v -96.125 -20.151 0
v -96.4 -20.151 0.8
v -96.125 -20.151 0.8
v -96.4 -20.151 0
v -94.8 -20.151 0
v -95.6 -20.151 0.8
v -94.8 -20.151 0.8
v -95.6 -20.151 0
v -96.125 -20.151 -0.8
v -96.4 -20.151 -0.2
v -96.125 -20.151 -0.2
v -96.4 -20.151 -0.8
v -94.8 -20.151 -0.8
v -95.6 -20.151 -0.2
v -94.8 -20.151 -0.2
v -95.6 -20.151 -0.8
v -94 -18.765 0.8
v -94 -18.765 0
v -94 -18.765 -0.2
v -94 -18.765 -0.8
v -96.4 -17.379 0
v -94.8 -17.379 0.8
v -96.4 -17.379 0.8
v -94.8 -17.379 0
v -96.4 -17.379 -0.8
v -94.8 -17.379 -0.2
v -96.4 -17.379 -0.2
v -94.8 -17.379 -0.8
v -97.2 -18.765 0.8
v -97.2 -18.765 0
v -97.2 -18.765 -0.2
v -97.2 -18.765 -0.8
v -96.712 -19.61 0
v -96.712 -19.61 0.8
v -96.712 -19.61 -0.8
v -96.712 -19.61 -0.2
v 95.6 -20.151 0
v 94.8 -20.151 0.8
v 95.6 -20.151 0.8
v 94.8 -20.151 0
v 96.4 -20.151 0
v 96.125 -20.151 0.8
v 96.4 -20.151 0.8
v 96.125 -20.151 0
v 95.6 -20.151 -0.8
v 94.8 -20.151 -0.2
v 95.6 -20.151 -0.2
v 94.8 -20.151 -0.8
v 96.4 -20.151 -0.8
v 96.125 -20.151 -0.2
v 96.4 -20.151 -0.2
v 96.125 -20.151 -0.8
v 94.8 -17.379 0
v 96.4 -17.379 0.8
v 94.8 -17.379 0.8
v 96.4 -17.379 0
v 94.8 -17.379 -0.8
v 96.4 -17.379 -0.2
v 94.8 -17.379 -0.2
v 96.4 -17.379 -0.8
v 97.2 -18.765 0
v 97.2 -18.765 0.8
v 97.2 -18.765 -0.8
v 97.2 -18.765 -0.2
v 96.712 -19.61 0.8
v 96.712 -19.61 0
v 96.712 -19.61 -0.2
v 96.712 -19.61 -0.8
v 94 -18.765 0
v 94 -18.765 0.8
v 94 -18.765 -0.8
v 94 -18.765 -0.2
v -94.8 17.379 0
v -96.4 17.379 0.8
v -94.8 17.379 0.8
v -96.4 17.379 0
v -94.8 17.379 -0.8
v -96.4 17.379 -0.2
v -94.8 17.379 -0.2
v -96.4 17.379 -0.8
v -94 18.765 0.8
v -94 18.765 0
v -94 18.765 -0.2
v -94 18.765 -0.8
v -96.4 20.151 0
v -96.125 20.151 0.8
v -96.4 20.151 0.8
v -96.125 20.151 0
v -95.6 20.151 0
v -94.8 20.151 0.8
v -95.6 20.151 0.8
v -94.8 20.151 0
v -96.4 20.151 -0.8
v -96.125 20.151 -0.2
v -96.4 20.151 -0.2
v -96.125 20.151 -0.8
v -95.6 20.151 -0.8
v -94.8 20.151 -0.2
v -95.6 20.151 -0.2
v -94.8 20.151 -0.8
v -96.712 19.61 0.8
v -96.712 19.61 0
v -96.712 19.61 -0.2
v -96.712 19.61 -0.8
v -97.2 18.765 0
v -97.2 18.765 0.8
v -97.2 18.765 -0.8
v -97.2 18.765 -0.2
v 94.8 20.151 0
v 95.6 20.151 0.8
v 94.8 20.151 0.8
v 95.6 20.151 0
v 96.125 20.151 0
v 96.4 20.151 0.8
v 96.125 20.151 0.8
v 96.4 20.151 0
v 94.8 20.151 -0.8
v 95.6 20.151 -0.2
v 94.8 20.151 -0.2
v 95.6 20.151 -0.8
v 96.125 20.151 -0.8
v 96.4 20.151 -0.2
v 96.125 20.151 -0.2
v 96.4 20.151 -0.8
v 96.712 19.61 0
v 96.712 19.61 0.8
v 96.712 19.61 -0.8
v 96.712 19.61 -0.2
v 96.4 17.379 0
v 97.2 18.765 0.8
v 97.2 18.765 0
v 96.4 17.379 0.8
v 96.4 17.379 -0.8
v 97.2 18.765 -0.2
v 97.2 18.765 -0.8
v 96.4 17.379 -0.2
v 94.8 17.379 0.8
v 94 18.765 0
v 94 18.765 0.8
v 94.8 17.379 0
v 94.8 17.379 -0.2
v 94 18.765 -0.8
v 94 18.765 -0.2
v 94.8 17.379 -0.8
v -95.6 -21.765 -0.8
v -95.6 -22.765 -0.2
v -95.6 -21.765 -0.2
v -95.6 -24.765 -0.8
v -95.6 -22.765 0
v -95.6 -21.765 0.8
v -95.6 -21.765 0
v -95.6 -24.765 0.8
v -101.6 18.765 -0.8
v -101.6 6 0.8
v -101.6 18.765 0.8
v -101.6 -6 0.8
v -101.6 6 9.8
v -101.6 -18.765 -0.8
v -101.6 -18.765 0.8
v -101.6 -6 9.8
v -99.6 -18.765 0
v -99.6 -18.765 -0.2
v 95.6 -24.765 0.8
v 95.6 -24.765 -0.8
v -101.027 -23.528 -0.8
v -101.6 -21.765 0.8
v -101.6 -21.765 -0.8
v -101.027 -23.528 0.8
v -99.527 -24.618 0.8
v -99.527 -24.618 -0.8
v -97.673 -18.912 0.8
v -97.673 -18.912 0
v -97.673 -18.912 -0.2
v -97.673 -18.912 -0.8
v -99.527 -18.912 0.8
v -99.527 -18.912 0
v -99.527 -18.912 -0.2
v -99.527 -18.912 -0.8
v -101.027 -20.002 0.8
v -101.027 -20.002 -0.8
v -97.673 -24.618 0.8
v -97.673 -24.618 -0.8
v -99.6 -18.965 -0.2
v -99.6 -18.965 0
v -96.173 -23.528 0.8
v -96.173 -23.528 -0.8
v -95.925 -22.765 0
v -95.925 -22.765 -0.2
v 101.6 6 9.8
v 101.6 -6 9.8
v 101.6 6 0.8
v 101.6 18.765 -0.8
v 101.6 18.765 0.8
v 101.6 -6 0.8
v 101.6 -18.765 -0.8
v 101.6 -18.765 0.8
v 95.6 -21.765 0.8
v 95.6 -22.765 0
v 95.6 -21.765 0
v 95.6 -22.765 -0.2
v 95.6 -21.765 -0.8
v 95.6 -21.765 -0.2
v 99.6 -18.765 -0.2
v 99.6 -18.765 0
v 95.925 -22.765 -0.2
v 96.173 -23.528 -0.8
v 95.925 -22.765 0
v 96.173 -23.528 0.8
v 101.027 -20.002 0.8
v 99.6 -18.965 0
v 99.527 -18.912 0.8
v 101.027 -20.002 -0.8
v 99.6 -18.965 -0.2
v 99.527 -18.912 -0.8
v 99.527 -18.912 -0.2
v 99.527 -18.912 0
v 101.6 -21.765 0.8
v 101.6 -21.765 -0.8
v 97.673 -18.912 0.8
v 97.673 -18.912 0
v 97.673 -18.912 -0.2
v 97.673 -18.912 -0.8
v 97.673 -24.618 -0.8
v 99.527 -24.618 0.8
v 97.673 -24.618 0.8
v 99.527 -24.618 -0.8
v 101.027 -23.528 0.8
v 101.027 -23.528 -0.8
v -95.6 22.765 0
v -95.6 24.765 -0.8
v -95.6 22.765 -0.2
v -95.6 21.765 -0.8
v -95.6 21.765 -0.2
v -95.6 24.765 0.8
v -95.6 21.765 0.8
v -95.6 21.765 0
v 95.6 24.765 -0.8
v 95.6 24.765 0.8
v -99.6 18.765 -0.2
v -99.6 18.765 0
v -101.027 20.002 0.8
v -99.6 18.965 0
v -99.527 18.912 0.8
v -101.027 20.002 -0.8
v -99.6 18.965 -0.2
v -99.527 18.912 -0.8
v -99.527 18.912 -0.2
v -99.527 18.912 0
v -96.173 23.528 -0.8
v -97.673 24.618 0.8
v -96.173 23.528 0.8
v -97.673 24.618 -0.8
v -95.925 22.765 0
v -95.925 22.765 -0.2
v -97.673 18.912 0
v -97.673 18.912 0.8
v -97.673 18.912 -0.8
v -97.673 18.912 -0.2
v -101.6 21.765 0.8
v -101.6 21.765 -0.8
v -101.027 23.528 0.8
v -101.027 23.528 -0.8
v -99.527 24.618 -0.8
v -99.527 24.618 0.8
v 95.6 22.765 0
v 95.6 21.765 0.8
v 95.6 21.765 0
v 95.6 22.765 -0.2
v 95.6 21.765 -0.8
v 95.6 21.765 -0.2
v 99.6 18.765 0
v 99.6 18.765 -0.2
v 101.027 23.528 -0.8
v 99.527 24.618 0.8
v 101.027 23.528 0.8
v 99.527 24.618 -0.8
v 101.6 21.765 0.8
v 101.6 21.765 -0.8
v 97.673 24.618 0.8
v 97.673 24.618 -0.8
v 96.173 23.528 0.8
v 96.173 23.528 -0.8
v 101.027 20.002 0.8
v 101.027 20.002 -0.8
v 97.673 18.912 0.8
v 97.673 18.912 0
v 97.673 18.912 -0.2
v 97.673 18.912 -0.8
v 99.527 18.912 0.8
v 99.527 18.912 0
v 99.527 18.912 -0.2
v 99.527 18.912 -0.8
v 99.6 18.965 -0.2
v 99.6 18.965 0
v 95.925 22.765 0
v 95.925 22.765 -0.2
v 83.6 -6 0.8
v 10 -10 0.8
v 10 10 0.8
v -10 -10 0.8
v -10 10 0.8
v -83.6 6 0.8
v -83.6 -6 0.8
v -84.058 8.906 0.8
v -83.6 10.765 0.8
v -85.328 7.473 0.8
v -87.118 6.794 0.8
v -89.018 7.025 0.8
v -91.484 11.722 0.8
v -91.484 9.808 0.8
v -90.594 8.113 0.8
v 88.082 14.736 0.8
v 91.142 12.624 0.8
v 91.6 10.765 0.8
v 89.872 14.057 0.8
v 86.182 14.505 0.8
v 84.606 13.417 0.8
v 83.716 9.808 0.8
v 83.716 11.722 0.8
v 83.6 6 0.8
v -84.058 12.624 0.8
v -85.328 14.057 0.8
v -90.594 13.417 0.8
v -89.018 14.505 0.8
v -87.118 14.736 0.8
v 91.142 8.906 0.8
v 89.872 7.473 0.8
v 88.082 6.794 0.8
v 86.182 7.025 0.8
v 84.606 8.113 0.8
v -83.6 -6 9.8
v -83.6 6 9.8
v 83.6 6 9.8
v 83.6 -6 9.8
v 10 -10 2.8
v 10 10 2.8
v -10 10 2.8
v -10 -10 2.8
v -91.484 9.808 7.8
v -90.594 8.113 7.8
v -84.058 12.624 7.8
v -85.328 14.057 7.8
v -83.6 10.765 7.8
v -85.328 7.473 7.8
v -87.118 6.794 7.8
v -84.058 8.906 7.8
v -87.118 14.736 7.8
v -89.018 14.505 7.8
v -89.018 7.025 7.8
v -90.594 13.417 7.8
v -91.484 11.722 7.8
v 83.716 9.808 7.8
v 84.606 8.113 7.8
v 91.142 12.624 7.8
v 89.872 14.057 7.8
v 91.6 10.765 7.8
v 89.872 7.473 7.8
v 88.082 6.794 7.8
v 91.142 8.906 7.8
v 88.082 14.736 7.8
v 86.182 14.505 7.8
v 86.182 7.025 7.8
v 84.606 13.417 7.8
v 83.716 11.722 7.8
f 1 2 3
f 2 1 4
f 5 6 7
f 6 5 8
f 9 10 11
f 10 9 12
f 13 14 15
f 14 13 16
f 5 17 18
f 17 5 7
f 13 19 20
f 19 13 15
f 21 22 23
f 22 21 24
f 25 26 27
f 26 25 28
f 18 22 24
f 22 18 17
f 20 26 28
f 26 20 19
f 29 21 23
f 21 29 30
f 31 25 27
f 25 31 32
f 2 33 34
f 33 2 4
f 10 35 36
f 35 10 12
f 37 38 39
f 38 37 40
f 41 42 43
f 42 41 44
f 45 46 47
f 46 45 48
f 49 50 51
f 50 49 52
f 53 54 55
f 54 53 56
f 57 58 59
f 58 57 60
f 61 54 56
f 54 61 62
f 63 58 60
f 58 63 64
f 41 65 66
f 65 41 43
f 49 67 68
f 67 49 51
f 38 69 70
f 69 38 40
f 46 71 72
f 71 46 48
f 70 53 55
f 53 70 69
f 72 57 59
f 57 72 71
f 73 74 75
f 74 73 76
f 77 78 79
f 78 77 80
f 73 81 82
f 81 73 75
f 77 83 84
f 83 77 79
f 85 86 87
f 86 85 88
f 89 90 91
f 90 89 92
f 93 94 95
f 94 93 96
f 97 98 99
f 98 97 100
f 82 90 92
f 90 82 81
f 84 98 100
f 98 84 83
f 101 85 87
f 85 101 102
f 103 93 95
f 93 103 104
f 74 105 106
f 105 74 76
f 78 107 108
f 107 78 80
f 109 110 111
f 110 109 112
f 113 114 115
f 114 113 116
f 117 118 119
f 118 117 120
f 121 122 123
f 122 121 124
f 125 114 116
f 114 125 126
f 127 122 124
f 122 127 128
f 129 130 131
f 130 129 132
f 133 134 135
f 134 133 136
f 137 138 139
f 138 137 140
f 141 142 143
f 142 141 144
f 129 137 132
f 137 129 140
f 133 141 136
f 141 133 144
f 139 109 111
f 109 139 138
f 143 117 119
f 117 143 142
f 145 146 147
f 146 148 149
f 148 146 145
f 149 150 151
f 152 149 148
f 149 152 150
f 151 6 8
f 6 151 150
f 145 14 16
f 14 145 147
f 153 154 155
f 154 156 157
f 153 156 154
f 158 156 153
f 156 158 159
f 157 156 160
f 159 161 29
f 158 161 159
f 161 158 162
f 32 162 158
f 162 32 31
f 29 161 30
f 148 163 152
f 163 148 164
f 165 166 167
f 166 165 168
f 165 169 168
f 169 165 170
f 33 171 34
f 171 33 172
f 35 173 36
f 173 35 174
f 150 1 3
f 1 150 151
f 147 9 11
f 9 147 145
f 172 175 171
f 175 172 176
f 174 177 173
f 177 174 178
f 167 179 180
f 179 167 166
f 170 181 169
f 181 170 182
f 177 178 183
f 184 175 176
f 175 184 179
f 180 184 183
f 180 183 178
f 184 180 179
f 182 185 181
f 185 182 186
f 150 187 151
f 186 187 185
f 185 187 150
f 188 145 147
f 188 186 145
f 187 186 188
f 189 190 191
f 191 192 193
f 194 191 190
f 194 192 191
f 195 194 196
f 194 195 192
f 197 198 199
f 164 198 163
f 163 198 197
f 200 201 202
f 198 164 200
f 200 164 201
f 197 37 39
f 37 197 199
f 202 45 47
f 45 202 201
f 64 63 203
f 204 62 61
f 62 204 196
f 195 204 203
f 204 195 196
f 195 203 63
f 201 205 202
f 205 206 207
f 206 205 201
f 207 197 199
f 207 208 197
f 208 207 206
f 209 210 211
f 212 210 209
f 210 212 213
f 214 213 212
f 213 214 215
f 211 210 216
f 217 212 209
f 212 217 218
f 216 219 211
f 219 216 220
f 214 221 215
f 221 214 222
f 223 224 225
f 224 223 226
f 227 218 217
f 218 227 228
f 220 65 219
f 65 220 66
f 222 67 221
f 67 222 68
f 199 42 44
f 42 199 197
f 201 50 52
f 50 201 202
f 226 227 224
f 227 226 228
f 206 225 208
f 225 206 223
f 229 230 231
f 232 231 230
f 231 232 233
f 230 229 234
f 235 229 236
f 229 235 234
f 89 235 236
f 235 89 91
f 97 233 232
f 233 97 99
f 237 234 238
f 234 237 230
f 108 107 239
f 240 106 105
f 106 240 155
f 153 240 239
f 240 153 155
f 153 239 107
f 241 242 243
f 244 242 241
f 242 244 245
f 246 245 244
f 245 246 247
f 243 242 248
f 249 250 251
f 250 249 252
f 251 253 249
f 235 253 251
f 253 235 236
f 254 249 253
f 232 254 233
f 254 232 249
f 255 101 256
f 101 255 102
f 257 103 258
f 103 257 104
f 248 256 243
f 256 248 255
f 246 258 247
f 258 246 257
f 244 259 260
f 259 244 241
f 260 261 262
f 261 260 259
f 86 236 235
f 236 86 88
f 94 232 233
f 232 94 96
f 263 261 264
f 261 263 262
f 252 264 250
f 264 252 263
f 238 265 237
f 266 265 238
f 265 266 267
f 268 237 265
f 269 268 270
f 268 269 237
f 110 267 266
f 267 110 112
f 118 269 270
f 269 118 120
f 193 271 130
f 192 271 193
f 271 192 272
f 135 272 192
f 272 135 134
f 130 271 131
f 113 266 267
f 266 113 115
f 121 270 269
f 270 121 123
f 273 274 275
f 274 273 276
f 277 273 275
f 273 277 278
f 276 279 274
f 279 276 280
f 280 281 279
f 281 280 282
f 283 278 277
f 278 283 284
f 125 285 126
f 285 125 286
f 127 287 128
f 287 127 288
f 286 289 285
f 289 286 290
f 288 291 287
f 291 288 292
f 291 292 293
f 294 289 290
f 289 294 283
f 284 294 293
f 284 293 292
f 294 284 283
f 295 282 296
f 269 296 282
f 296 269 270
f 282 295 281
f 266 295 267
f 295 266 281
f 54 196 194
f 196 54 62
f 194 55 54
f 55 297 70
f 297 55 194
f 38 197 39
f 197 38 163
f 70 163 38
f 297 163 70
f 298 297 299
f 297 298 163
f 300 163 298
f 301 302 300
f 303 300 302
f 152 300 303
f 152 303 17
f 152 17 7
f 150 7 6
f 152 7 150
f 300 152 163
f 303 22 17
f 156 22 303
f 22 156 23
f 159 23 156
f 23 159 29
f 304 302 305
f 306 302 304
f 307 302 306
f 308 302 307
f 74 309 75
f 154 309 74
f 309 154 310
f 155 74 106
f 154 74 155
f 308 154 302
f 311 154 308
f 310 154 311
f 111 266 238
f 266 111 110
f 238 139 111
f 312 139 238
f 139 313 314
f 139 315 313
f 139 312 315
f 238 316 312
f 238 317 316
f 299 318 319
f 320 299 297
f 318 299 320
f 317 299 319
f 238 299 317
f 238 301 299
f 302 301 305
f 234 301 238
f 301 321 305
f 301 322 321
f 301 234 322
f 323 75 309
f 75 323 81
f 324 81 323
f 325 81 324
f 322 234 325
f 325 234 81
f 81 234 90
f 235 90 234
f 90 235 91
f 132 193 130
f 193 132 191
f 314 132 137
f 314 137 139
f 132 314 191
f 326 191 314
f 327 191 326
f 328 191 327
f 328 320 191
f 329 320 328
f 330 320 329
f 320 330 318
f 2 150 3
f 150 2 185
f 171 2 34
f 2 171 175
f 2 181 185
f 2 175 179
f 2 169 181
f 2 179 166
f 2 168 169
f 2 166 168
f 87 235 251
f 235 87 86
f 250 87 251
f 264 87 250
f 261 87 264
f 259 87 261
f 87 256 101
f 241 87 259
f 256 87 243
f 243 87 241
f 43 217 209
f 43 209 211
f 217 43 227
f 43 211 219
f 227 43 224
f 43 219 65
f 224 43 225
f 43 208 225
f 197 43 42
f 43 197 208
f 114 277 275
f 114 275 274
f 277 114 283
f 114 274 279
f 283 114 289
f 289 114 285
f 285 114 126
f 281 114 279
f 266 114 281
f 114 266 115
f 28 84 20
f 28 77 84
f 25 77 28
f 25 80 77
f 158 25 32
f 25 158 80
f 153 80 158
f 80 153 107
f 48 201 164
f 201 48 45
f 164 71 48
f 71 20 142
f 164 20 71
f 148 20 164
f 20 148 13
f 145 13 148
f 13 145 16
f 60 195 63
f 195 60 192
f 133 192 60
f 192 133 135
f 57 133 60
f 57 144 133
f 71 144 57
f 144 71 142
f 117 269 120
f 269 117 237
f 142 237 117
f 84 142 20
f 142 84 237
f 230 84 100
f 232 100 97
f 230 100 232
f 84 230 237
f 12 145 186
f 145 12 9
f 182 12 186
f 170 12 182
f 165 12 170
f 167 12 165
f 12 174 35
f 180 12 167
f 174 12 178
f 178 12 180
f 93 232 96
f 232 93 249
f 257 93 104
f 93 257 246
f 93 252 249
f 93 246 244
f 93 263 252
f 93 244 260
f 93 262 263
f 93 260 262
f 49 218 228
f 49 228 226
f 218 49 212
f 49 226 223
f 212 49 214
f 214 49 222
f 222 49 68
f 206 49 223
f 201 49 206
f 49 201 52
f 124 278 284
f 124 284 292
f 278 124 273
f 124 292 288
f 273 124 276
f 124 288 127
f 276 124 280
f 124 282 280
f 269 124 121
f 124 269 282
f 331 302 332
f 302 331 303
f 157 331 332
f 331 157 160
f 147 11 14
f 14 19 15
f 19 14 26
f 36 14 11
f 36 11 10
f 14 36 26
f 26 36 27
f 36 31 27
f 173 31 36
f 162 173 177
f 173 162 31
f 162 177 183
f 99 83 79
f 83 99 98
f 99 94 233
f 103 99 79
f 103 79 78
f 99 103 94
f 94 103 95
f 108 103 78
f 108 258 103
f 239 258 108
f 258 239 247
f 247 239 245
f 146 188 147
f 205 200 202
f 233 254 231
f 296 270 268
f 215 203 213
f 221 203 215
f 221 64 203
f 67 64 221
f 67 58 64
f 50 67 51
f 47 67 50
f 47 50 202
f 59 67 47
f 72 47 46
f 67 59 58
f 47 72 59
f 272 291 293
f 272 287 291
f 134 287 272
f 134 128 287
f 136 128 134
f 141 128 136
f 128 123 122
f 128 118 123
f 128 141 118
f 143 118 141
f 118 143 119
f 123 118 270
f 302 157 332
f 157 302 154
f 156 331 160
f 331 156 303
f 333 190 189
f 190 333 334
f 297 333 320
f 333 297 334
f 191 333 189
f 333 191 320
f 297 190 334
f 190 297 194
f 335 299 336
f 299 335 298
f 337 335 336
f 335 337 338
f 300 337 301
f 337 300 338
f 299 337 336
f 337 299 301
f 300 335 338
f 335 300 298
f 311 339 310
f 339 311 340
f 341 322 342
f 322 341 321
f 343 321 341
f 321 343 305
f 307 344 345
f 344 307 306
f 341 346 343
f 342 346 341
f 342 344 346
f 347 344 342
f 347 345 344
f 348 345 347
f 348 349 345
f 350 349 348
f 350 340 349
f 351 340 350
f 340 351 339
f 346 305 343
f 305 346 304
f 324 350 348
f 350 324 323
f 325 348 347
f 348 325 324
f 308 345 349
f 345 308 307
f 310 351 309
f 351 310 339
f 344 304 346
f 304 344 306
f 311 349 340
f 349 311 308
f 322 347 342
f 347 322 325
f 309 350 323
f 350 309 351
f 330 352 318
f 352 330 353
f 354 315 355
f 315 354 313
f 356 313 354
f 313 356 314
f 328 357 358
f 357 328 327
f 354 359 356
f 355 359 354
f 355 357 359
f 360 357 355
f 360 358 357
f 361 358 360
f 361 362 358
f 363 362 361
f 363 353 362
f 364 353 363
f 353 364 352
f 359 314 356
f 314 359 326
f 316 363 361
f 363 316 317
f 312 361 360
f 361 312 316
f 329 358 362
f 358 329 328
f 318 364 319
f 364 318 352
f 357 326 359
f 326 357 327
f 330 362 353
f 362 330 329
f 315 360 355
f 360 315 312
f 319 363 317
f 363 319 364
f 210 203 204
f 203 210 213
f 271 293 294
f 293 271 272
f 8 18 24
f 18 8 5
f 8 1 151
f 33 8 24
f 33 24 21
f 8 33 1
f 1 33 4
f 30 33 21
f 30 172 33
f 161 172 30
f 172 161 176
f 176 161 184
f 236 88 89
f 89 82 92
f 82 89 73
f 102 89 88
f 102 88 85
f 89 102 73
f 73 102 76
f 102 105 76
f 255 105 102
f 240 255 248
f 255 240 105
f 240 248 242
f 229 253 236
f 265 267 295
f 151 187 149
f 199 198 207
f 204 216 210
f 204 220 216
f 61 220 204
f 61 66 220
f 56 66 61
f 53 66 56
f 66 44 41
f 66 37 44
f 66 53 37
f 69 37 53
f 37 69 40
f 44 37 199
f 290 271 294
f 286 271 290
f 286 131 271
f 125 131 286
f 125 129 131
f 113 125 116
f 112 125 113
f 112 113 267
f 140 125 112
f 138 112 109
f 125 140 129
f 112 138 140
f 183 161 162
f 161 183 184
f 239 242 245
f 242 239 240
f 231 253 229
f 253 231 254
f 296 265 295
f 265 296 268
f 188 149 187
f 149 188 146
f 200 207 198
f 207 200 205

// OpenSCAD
// Parameters
pcb_length = 203.2; //[101.6:406.4:0.1]
pcb_width = 49.53; //[24.765:99.06:0.01]
pcb_thickness = 1.6; //[0.8:3.2:0.1]
corner_radius = 3.0; //[1.5:6.0:0.1]
mount_hole_diameter = 3.2; //[2.0:5.0:0.1]
mount_hole_edge_offset_x = 6.0; //[3.0:12.0:0.1]
mount_hole_edge_offset_y = 6.0; //[3.0:12.0:0.1]
hole_clearance_height = 6.0; //[3.0:12.0:0.5]
overlap = 1.0; //[0.5:2.0:0.1]
silkscreen_thickness = 0.2; //[0.1:0.5:0.05]
silkscreen_margin = 2.0; //[1.0:5.0:0.1]
connector_block_length = 18.0; //[9.0:36.0:0.5]
connector_block_width = 12.0; //[6.0:24.0:0.5]
connector_block_height = 10.0; //[5.0:20.0:0.5]
component_chip_length = 20.0; //[10.0:40.0:0.5]
component_chip_width = 20.0; //[10.0:40.0:0.5]
component_chip_height = 3.0; //[1.5:6.0:0.1]
component_cap_radius = 4.0; //[2.0:8.0:0.1]
component_cap_height = 8.0; //[4.0:16.0:0.5]

// Main PCB Body
module pcb_main_body() {
  color([0.0, 0.4, 0.2]) // Green PCB
  cube([pcb_length, pcb_width, pcb_thickness], center=true);
}

// Mounting Holes
module mounting_holes() {
  union() {
    translate([-pcb_length/2 + mount_hole_edge_offset_x, -pcb_width/2 + mount_hole_edge_offset_y, 0])
      cylinder(r=mount_hole_diameter/2, h=hole_clearance_height, center=true);
    translate([pcb_length/2 - mount_hole_edge_offset_x, -pcb_width/2 + mount_hole_edge_offset_y, 0])
      cylinder(r=mount_hole_diameter/2, h=hole_clearance_height, center=true);
    translate([-pcb_length/2 + mount_hole_edge_offset_x, pcb_width/2 - mount_hole_edge_offset_y, 0])
      cylinder(r=mount_hole_diameter/2, h=hole_clearance_height, center=true);
    translate([pcb_length/2 - mount_hole_edge_offset_x, pcb_width/2 - mount_hole_edge_offset_y, 0])
      cylinder(r=mount_hole_diameter/2, h=hole_clearance_height, center=true);
  }
}

// Corner Fillets
module corner_fillet() {
  union() {
    difference() {
      translate([-pcb_length/2 + corner_radius, -pcb_width/2 + corner_radius, 0])
        cube([corner_radius*2, corner_radius*2, hole_clearance_height], center=true);
      translate([-pcb_length/2 + corner_radius, -pcb_width/2 + corner_radius, 0])
        cylinder(r=corner_radius, h=hole_clearance_height, center=true);
    }
    difference() {
      translate([pcb_length/2 - corner_radius, -pcb_width/2 + corner_radius, 0])
        cube([corner_radius*2, corner_radius*2, hole_clearance_height], center=true);
      translate([pcb_length/2 - corner_radius, -pcb_width/2 + corner_radius, 0])
        cylinder(r=corner_radius, h=hole_clearance_height, center=true);
    }
    difference() {
      translate([-pcb_length/2 + corner_radius, pcb_width/2 - corner_radius, 0])
        cube([corner_radius*2, corner_radius*2, hole_clearance_height], center=true);
      translate([-pcb_length/2 + corner_radius, pcb_width/2 - corner_radius, 0])
        cylinder(r=corner_radius, h=hole_clearance_height, center=true);
    }
    difference() {
      translate([pcb_length/2 - corner_radius, pcb_width/2 - corner_radius, 0])
        cube([corner_radius*2, corner_radius*2, hole_clearance_height], center=true);
      translate([pcb_length/2 - corner_radius, pcb_width/2 - corner_radius, 0])
        cylinder(r=corner_radius, h=hole_clearance_height, center=true);
    }
  }
}

// Silkscreen Markings
module silkscreen_markings() {
  color("White")
  translate([0, 0, pcb_thickness/2 + silkscreen_thickness/2 - overlap])
    cube([pcb_length - 2*silkscreen_margin, pcb_width - 2*silkscreen_margin, silkscreen_thickness], center=true);
}

// Connectors
module connectors() {
  color([0.5, 0.5, 0.5]) // Light gray connectors
  union() {
    translate([-pcb_length/2 + connector_block_length/2, 0, pcb_thickness/2 + connector_block_height/2 - overlap])
      cube([connector_block_length, connector_block_width, connector_block_height], center=true);
    translate([pcb_length/2 - connector_block_length/2, 0, pcb_thickness/2 + connector_block_height/2 - overlap])
      cube([connector_block_length, connector_block_width, connector_block_height], center=true);
  }
}

// Components
module components() {
  color([0.2, 0.2, 0.2]) // Dark gray components
  union() {
    translate([0, 0, pcb_thickness/2 + component_chip_height/2 - overlap])
      cube([component_chip_length, component_chip_width, component_chip_height], center=true);
    translate([-pcb_length/2 + mount_hole_edge_offset_x + component_cap_radius*2, pcb_width/2 - mount_hole_edge_offset_y - component_cap_radius*2, pcb_thickness/2 + component_cap_height/2 - overlap])
      cylinder(r=component_cap_radius, h=component_cap_height, center=true);
    translate([pcb_length/2 - mount_hole_edge_offset_x - component_cap_radius*2, pcb_width/2 - mount_hole_edge_offset_y - component_cap_radius*2, pcb_thickness/2 + component_cap_height/2 - overlap])
      cylinder(r=component_cap_radius, h=component_cap_height, center=true);
  }
}

// Complete Model
module complete_model() {
  difference() {
    pcb_main_body();
    mounting_holes();
    corner_fillet();
  }
  silkscreen_markings();
  connectors();
  components();
}

// Render the complete model
complete_model();
